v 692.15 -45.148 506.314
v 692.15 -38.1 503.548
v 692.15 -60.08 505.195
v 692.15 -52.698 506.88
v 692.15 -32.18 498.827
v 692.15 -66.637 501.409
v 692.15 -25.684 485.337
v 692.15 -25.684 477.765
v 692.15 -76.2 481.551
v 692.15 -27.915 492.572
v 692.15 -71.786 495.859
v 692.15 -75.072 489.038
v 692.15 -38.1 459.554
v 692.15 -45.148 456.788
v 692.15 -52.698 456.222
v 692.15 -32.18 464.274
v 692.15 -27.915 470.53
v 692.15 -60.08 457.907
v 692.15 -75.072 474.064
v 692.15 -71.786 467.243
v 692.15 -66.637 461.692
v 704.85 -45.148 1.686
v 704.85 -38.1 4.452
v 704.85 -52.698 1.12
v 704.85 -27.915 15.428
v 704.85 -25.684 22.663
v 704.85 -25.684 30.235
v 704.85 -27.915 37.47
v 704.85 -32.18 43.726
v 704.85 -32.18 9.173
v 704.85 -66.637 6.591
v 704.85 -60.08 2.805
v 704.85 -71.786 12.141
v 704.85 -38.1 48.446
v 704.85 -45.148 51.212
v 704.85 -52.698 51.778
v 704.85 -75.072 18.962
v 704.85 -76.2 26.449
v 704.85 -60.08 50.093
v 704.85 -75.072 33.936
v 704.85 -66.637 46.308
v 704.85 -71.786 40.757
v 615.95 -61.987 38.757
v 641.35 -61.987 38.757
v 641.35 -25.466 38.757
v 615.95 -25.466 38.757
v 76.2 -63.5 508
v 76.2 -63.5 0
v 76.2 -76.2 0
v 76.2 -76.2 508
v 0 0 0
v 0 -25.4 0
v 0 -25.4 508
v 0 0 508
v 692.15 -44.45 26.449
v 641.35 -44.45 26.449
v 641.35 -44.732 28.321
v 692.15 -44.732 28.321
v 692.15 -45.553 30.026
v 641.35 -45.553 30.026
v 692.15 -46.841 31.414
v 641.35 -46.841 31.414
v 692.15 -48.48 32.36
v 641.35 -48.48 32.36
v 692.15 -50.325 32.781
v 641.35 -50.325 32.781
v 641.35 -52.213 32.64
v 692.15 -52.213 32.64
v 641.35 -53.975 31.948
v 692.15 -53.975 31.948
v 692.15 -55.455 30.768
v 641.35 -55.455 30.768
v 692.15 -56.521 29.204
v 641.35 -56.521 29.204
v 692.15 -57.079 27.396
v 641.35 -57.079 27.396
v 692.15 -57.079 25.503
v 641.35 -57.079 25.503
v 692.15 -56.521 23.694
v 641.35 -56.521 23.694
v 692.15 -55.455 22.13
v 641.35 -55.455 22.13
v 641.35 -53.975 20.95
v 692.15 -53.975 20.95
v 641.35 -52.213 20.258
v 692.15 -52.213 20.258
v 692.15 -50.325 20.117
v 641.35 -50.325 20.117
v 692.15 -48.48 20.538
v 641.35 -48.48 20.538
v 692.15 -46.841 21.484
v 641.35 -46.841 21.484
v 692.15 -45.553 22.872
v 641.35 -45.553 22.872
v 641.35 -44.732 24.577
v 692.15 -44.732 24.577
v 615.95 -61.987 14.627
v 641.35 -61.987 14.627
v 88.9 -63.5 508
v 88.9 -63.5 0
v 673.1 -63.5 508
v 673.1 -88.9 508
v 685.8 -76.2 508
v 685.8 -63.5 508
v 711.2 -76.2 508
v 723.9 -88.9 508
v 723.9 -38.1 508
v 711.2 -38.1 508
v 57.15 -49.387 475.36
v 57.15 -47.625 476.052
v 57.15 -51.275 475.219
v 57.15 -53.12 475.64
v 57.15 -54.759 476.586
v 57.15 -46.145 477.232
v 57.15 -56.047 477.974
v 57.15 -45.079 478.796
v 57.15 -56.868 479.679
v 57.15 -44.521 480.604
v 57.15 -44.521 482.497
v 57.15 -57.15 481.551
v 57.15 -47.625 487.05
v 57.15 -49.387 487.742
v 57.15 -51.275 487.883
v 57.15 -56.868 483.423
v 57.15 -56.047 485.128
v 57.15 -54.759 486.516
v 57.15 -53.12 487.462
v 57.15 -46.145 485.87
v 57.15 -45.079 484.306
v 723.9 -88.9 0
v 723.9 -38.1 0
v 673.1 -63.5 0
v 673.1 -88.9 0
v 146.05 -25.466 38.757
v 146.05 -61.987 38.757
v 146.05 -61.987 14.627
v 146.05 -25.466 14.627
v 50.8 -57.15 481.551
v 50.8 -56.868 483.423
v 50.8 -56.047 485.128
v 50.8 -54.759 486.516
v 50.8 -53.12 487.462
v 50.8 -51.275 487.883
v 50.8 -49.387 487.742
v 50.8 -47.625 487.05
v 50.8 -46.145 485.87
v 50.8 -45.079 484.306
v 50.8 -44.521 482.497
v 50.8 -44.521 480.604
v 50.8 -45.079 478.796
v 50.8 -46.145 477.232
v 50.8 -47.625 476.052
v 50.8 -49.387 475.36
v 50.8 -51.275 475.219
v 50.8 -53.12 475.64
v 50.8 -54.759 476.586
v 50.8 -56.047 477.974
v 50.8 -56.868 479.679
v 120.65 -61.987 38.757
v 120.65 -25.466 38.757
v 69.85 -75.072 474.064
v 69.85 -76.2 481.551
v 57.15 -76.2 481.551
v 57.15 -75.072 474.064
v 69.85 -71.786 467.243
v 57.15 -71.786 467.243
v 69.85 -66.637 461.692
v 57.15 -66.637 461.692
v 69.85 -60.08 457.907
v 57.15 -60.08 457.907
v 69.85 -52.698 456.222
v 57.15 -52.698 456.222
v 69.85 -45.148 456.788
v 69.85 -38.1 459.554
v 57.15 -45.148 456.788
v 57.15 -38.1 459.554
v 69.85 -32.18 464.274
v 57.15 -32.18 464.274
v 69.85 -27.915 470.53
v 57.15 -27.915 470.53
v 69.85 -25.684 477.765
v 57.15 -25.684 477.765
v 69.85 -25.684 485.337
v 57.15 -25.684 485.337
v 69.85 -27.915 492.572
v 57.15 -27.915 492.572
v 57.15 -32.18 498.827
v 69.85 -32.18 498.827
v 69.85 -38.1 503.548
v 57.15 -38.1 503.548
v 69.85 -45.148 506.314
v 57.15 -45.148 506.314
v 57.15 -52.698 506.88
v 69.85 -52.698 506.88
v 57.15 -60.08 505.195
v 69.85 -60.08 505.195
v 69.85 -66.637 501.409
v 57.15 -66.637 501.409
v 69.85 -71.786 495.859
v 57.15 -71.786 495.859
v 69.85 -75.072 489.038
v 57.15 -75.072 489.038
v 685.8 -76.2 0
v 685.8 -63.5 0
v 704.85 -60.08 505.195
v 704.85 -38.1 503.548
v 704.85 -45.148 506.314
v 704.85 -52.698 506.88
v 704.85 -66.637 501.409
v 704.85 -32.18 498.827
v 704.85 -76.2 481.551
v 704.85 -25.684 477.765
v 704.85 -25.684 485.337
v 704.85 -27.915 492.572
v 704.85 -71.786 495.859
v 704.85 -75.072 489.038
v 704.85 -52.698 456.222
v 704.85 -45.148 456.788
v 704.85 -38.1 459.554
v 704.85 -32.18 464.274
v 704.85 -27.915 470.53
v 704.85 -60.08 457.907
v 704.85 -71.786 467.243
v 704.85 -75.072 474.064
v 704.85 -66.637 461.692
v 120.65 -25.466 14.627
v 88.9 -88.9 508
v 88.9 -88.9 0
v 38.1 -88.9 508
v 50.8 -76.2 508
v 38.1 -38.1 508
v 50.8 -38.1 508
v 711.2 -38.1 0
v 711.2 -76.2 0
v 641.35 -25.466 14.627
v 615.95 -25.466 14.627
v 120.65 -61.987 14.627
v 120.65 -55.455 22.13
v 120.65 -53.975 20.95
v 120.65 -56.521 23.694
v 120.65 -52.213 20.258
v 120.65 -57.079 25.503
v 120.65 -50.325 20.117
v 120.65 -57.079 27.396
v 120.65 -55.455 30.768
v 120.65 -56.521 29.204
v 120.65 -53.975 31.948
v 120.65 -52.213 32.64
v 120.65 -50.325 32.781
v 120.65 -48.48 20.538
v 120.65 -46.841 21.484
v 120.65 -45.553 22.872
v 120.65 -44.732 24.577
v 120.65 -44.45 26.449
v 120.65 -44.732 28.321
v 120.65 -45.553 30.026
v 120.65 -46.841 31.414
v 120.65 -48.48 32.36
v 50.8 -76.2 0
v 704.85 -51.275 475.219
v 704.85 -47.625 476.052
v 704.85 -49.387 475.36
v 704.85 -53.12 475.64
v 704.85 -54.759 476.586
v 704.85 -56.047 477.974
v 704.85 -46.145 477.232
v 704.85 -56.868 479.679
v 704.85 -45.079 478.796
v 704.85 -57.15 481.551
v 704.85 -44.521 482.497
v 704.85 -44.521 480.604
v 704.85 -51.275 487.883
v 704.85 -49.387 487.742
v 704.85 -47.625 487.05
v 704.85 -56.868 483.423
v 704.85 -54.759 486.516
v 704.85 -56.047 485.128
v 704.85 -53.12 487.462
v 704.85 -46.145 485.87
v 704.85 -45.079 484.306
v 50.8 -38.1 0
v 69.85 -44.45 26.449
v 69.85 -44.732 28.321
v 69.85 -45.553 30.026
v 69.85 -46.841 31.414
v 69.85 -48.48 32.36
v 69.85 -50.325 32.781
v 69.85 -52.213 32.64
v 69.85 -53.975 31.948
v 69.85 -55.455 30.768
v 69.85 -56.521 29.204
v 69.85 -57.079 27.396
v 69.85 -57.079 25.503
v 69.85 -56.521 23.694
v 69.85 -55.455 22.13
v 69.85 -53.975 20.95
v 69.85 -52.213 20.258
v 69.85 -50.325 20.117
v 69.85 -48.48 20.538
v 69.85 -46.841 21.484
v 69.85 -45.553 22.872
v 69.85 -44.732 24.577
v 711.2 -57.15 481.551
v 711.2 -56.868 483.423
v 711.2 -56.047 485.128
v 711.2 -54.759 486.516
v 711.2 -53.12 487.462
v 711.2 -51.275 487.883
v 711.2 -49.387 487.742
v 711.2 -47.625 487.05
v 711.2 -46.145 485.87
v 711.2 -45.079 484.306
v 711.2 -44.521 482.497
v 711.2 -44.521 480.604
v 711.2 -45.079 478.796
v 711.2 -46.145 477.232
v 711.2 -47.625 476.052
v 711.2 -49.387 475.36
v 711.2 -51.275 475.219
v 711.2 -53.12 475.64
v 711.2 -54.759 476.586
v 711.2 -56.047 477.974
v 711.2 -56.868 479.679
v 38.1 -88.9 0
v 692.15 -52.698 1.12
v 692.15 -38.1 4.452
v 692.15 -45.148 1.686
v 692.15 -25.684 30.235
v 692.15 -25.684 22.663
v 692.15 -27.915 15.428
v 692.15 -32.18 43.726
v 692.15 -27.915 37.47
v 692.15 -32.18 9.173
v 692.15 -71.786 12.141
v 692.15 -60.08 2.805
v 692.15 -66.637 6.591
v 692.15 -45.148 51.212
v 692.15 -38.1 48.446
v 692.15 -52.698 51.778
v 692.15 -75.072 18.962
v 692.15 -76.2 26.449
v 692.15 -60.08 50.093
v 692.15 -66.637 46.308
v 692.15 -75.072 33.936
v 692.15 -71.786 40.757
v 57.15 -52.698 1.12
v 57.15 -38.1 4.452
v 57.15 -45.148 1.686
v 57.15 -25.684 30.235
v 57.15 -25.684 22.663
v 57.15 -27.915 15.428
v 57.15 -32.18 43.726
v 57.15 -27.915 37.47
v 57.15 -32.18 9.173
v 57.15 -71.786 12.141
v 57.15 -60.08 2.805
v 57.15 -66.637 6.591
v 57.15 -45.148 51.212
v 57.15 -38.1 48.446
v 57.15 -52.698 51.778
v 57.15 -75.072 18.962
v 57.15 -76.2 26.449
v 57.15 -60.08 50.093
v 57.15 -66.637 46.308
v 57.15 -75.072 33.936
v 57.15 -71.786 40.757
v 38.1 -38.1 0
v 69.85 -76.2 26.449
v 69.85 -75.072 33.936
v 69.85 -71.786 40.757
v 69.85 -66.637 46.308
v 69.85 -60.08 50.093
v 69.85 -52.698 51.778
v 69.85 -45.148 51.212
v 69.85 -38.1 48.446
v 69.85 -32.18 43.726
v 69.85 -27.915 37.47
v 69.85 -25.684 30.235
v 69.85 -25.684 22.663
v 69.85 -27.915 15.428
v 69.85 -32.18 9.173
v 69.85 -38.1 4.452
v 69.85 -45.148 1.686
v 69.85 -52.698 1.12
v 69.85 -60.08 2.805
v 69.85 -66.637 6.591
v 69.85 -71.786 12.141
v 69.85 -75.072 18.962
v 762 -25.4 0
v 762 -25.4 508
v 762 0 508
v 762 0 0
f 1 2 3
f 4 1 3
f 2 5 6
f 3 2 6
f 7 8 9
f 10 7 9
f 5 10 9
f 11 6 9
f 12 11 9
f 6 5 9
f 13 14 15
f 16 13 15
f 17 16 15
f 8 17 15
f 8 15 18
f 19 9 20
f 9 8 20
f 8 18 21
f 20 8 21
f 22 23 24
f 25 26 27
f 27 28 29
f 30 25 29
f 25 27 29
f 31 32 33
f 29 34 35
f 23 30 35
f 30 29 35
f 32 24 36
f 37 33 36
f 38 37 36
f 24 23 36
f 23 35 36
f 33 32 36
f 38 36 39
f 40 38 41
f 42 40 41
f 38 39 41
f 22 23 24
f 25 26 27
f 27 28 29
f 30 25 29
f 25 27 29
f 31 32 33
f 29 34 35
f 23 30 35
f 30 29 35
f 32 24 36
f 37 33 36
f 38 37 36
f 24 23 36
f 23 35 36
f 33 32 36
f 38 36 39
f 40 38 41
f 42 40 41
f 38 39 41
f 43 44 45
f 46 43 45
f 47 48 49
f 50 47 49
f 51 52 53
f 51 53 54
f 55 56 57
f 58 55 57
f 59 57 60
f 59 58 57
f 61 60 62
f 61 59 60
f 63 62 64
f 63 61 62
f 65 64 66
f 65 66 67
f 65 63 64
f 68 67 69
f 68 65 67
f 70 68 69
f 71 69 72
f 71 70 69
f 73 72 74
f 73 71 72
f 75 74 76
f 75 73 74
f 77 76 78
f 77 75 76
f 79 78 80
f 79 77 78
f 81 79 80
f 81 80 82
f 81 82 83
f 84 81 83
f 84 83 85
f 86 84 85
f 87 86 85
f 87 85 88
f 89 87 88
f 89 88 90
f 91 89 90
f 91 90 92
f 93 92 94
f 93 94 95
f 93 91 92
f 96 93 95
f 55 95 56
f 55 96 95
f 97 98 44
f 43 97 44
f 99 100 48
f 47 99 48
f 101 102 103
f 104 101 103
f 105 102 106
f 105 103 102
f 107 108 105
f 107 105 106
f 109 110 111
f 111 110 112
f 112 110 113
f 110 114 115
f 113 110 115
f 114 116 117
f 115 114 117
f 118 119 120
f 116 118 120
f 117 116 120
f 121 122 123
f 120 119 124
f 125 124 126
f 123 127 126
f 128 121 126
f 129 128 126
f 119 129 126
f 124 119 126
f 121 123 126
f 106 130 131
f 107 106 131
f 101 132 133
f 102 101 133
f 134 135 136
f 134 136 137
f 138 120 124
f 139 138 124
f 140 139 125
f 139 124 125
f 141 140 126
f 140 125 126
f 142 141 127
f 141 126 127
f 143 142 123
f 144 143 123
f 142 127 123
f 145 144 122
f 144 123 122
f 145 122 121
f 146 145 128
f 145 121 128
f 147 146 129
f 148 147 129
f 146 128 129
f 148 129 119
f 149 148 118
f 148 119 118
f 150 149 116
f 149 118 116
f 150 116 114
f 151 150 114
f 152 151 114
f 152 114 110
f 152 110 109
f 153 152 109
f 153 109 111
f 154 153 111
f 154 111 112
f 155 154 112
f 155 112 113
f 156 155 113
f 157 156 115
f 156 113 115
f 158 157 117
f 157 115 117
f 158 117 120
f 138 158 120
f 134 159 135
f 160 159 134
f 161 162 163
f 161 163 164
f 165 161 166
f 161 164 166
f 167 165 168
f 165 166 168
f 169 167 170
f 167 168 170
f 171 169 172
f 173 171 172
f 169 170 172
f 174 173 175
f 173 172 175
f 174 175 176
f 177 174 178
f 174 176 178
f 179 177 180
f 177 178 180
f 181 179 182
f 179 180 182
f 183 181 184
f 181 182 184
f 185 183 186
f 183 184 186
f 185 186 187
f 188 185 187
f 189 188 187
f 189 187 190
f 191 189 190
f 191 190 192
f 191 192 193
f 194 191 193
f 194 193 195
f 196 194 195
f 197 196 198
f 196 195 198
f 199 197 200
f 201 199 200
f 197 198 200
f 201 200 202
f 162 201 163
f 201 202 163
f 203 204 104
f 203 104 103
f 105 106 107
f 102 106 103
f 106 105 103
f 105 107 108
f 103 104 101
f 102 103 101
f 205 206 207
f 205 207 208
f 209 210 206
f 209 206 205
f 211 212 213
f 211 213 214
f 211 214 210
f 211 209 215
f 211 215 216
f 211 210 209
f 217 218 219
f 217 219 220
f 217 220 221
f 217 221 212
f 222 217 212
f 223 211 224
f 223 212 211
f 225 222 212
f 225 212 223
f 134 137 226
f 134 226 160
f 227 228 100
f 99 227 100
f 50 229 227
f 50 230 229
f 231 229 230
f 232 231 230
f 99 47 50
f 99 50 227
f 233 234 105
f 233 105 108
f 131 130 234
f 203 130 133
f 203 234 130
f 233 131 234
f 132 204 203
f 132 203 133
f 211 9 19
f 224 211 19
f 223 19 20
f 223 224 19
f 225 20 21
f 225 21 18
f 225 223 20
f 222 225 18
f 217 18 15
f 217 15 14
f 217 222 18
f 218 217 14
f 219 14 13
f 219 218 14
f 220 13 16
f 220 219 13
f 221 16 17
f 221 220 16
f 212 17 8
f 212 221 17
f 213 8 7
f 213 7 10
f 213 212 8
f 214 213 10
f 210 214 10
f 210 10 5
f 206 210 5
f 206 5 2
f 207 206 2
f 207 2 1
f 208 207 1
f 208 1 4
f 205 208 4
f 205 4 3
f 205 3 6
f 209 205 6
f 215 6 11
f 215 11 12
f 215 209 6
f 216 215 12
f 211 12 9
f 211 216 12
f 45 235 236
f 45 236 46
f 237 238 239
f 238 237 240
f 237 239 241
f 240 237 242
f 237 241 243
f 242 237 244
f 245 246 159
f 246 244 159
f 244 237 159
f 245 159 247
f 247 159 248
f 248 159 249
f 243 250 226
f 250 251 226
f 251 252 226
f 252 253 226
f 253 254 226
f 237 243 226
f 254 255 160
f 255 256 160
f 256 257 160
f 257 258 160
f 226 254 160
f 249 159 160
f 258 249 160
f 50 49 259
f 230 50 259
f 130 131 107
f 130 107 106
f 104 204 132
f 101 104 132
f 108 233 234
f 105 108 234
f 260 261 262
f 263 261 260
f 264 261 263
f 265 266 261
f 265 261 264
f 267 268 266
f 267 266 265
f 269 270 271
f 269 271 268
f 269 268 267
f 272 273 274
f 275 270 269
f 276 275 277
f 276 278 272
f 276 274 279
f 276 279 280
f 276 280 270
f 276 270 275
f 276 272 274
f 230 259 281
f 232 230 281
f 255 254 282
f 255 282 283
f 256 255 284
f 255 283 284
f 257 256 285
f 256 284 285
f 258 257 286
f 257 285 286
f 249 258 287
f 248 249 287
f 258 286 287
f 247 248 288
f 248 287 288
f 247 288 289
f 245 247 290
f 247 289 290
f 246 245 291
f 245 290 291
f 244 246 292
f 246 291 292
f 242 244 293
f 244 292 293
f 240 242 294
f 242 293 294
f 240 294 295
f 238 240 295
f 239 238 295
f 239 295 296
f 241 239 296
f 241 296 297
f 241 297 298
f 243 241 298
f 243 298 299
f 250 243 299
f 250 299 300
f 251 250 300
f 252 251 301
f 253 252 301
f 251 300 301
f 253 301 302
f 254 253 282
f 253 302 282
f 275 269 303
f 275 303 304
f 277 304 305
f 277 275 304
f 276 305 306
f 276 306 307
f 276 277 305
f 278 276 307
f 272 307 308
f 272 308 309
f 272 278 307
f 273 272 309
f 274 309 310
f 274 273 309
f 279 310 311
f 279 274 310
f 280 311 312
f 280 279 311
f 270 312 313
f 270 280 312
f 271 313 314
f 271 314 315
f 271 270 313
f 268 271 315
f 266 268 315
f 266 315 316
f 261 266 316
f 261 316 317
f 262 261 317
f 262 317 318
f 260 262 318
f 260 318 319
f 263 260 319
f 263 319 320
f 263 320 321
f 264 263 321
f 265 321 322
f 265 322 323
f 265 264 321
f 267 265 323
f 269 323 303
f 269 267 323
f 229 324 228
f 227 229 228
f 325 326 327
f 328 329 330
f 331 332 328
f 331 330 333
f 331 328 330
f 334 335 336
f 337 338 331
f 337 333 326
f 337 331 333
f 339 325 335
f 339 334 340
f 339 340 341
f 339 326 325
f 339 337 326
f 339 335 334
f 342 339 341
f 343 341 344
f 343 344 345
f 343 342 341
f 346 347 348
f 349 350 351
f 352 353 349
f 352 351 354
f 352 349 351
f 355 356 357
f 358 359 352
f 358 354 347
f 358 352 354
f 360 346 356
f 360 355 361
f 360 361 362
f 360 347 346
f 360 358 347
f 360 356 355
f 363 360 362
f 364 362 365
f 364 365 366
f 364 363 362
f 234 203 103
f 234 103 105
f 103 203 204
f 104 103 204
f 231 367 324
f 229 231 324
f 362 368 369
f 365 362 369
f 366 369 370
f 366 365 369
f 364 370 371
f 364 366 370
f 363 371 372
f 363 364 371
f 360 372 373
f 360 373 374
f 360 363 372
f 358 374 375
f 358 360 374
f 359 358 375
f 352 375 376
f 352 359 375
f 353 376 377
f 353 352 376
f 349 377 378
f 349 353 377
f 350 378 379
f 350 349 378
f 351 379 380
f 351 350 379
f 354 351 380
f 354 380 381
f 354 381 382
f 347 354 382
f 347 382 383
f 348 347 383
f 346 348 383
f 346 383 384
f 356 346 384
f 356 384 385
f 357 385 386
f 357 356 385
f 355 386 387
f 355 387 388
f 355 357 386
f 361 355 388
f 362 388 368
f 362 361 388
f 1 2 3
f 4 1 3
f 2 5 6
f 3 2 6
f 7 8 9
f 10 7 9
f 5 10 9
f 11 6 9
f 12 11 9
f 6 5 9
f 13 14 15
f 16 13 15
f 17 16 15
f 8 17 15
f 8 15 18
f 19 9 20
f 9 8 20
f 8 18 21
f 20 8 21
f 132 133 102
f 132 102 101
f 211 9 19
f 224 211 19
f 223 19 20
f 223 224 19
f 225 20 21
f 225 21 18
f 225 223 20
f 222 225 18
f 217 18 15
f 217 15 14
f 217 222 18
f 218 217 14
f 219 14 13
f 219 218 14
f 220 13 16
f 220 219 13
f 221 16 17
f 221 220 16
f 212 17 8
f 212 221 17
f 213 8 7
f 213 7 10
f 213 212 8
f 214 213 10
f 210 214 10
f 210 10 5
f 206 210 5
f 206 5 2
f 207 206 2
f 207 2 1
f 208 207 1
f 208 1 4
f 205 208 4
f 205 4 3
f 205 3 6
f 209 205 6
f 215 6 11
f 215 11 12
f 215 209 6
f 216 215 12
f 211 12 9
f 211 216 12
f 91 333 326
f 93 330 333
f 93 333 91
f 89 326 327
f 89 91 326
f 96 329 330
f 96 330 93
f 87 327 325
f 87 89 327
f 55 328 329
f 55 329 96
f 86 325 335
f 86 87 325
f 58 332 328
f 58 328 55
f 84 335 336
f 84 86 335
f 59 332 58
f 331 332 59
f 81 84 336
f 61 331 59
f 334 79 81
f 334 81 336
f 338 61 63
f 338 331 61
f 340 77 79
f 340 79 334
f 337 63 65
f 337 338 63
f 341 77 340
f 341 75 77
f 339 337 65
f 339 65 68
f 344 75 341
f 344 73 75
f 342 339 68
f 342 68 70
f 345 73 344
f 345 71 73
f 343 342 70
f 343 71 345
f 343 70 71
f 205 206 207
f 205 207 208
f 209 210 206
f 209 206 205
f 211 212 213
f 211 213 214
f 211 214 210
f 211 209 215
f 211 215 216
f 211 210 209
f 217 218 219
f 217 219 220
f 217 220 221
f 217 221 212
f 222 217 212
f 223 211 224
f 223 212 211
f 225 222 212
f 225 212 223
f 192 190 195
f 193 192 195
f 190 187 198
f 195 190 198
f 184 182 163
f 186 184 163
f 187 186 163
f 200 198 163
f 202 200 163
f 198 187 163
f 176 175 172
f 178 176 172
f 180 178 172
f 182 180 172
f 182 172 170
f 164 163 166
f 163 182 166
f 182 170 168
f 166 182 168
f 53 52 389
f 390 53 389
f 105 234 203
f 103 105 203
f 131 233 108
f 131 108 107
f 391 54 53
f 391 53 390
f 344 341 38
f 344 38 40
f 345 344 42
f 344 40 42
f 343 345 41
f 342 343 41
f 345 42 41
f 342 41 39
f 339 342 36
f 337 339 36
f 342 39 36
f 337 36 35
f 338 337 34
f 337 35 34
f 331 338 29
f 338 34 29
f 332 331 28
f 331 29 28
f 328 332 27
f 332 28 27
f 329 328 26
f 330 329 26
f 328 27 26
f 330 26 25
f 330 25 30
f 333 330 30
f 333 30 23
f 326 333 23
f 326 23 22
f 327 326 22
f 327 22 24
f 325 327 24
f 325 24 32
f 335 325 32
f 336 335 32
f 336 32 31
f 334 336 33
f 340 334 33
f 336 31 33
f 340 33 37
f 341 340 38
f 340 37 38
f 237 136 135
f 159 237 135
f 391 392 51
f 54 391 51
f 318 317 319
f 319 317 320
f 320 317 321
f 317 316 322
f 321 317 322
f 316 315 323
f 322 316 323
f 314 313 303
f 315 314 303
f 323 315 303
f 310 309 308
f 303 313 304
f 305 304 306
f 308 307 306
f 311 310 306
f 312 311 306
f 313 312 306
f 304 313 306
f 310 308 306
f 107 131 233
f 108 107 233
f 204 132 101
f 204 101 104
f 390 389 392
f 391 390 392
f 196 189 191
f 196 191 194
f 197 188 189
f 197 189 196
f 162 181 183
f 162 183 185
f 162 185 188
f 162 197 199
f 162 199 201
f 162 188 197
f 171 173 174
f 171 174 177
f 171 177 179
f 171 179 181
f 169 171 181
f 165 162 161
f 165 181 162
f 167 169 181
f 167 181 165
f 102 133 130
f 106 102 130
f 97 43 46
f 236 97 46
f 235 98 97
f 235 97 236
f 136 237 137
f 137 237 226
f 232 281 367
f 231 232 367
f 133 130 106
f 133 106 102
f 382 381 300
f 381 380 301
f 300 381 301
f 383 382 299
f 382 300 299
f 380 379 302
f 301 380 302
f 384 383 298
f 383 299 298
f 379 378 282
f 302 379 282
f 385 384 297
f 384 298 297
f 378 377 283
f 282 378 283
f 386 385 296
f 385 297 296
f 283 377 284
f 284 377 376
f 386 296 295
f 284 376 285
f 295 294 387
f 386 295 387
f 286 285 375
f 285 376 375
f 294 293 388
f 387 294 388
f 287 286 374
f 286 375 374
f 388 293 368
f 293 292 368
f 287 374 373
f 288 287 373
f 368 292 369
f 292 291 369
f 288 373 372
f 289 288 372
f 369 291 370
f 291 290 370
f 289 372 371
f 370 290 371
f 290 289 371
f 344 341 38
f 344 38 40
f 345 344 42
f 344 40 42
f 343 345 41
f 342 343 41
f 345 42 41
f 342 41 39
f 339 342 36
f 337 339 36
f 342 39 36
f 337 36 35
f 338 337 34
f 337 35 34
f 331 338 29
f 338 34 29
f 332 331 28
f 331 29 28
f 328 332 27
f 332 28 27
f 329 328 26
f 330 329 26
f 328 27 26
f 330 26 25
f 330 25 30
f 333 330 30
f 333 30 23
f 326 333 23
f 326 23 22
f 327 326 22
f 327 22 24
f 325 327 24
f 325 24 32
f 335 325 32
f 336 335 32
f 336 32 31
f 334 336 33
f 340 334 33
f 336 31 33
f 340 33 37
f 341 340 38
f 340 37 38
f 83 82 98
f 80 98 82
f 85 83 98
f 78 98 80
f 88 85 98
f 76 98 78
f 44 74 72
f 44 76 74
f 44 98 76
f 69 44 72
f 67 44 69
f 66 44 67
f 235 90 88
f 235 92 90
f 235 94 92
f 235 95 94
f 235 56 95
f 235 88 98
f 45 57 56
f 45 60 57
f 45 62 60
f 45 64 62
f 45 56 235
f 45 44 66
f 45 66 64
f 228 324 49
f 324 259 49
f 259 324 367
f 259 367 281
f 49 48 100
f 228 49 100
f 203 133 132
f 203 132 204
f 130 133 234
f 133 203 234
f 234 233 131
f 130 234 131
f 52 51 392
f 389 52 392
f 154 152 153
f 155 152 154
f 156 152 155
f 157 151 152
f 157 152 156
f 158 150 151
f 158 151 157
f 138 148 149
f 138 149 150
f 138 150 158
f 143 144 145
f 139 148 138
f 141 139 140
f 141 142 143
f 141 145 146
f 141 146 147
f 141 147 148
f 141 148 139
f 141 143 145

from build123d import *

# Parameters (mm, degrees)
F0_W      = 381
F0_H      = 25.4
F1_DEPTH  = 508
F3_R      = 25.4
F4_DEPTH  = 6.35
F10_R     = 6.35
F11_DEPTH = 50.8
F13_W     = 36.5209167916
F13_H     = 24.13
F14_DEPTH = 25.4
F17_R     = 6.35
F18_DEPTH = 6.35


with BuildPart() as f1:
    # F0 (on Top) → F1 (new body)
    with BuildSketch(Plane.XY):
        with Locations((190.5, -12.7)):
            Rectangle(F0_W, F0_H)
        with Locations((571.5, -12.7)):
            Rectangle(F0_W, F0_H)
    extrude(amount=F1_DEPTH)


with BuildPart() as f1b:
    # F0 (on Top) → F1, piece 2 (new body)
    with BuildSketch(Plane.XY):
        Polygon((38.1, -38.1), (38.1, -88.9), (88.9, -88.9), (88.9, -63.5), (76.2, -63.5), (76.2, -76.2), (50.8, -76.2), (50.8, -38.1), align=None)
    extrude(amount=F1_DEPTH)


with BuildPart() as f1c:
    # F0 (on Top) → F1, piece 3 (new body)
    with BuildSketch(Plane.XY):
        Polygon((685.8, -63.5), (673.1, -63.5), (673.1, -88.9), (723.9, -88.9), (723.9, -38.1), (711.2, -38.1), (711.2, -76.2), (685.8, -76.2), align=None)
    extrude(amount=F1_DEPTH)


with BuildPart() as f4:
    # F3 (on offset) → F4 (new body, symmetric)
    with BuildSketch(Plane(origin=(63.5, 0, 0), x_dir=(0, -1, 0), z_dir=(-1, 0, 0))):
        with Locations((50.8, 26.4491215348)):
            Circle(F3_R)
    extrude(amount=F4_DEPTH, both=True)


with BuildPart() as f6_1:
    # F6: instance of F4
    add(f4.part.mirror(Plane(origin=(381, -12.7, 254), x_dir=(0, -1, 0), z_dir=(-1, 0, 0))))


with BuildPart() as f6_2:
    # F6: instance of F1b
    add(f1b.part.mirror(Plane(origin=(381, -12.7, 254), x_dir=(0, -1, 0), z_dir=(-1, 0, 0))))


with BuildPart() as f8_1:
    # F8: instance of F4
    add(f4.part.mirror(Plane(origin=(381, -12.7, 254), x_dir=(1, 0, 0), z_dir=(0, 0, -1))))


with BuildPart() as f8_2:
    # F8: instance of F6_1
    add(f6_1.part.mirror(Plane(origin=(381, -12.7, 254), x_dir=(1, 0, 0), z_dir=(0, 0, -1))))


with BuildPart() as f4_1:
    add(f4.part)

    # F10 (on offset) → F11 (join)
    with BuildSketch(Plane.YZ.offset(69.85)):
        with Locations((-50.8, 26.4491215348)):
            Circle(F10_R)
    extrude(amount=F11_DEPTH)

    # F13 (on offset) → F14 (join)
    with BuildSketch(Plane.YZ.offset(120.65)):
        with Locations((-43.7268996611, 26.6924910247)):
            Rectangle(F13_W, F13_H)
    extrude(amount=F14_DEPTH)


with BuildPart() as f15_1:
    # F15: instance of F4
    add(f4_1.part.mirror(Plane(origin=(381, -12.7, 254), x_dir=(0, -1, 0), z_dir=(-1, 0, 0))))


with BuildPart() as f15_2:
    # F15: instance of F8_1
    add(f8_1.part.mirror(Plane(origin=(381, -12.7, 254), x_dir=(0, -1, 0), z_dir=(-1, 0, 0))))


with BuildPart() as f18:
    # F17 (on offset) → F18 (new body, through all)
    with BuildSketch(Plane(origin=(57.15, 0, 0), x_dir=(0, -1, 0), z_dir=(-1, 0, 0))):
        with Locations((50.8, 481.5508784652)):
            Circle(F17_R)
    extrude(amount=F18_DEPTH)


with BuildPart() as f19_1:
    # F19: instance of F18
    add(f18.part.mirror(Plane(origin=(381, -12.7, 254), x_dir=(0, -1, 0), z_dir=(-1, 0, 0))))


solid = Compound([f1.part, f1b.part, f1c.part, f6_1.part, f6_2.part, f8_1.part, f8_2.part, f4_1.part, f15_1.part, f15_2.part, f18.part, f19_1.part])
